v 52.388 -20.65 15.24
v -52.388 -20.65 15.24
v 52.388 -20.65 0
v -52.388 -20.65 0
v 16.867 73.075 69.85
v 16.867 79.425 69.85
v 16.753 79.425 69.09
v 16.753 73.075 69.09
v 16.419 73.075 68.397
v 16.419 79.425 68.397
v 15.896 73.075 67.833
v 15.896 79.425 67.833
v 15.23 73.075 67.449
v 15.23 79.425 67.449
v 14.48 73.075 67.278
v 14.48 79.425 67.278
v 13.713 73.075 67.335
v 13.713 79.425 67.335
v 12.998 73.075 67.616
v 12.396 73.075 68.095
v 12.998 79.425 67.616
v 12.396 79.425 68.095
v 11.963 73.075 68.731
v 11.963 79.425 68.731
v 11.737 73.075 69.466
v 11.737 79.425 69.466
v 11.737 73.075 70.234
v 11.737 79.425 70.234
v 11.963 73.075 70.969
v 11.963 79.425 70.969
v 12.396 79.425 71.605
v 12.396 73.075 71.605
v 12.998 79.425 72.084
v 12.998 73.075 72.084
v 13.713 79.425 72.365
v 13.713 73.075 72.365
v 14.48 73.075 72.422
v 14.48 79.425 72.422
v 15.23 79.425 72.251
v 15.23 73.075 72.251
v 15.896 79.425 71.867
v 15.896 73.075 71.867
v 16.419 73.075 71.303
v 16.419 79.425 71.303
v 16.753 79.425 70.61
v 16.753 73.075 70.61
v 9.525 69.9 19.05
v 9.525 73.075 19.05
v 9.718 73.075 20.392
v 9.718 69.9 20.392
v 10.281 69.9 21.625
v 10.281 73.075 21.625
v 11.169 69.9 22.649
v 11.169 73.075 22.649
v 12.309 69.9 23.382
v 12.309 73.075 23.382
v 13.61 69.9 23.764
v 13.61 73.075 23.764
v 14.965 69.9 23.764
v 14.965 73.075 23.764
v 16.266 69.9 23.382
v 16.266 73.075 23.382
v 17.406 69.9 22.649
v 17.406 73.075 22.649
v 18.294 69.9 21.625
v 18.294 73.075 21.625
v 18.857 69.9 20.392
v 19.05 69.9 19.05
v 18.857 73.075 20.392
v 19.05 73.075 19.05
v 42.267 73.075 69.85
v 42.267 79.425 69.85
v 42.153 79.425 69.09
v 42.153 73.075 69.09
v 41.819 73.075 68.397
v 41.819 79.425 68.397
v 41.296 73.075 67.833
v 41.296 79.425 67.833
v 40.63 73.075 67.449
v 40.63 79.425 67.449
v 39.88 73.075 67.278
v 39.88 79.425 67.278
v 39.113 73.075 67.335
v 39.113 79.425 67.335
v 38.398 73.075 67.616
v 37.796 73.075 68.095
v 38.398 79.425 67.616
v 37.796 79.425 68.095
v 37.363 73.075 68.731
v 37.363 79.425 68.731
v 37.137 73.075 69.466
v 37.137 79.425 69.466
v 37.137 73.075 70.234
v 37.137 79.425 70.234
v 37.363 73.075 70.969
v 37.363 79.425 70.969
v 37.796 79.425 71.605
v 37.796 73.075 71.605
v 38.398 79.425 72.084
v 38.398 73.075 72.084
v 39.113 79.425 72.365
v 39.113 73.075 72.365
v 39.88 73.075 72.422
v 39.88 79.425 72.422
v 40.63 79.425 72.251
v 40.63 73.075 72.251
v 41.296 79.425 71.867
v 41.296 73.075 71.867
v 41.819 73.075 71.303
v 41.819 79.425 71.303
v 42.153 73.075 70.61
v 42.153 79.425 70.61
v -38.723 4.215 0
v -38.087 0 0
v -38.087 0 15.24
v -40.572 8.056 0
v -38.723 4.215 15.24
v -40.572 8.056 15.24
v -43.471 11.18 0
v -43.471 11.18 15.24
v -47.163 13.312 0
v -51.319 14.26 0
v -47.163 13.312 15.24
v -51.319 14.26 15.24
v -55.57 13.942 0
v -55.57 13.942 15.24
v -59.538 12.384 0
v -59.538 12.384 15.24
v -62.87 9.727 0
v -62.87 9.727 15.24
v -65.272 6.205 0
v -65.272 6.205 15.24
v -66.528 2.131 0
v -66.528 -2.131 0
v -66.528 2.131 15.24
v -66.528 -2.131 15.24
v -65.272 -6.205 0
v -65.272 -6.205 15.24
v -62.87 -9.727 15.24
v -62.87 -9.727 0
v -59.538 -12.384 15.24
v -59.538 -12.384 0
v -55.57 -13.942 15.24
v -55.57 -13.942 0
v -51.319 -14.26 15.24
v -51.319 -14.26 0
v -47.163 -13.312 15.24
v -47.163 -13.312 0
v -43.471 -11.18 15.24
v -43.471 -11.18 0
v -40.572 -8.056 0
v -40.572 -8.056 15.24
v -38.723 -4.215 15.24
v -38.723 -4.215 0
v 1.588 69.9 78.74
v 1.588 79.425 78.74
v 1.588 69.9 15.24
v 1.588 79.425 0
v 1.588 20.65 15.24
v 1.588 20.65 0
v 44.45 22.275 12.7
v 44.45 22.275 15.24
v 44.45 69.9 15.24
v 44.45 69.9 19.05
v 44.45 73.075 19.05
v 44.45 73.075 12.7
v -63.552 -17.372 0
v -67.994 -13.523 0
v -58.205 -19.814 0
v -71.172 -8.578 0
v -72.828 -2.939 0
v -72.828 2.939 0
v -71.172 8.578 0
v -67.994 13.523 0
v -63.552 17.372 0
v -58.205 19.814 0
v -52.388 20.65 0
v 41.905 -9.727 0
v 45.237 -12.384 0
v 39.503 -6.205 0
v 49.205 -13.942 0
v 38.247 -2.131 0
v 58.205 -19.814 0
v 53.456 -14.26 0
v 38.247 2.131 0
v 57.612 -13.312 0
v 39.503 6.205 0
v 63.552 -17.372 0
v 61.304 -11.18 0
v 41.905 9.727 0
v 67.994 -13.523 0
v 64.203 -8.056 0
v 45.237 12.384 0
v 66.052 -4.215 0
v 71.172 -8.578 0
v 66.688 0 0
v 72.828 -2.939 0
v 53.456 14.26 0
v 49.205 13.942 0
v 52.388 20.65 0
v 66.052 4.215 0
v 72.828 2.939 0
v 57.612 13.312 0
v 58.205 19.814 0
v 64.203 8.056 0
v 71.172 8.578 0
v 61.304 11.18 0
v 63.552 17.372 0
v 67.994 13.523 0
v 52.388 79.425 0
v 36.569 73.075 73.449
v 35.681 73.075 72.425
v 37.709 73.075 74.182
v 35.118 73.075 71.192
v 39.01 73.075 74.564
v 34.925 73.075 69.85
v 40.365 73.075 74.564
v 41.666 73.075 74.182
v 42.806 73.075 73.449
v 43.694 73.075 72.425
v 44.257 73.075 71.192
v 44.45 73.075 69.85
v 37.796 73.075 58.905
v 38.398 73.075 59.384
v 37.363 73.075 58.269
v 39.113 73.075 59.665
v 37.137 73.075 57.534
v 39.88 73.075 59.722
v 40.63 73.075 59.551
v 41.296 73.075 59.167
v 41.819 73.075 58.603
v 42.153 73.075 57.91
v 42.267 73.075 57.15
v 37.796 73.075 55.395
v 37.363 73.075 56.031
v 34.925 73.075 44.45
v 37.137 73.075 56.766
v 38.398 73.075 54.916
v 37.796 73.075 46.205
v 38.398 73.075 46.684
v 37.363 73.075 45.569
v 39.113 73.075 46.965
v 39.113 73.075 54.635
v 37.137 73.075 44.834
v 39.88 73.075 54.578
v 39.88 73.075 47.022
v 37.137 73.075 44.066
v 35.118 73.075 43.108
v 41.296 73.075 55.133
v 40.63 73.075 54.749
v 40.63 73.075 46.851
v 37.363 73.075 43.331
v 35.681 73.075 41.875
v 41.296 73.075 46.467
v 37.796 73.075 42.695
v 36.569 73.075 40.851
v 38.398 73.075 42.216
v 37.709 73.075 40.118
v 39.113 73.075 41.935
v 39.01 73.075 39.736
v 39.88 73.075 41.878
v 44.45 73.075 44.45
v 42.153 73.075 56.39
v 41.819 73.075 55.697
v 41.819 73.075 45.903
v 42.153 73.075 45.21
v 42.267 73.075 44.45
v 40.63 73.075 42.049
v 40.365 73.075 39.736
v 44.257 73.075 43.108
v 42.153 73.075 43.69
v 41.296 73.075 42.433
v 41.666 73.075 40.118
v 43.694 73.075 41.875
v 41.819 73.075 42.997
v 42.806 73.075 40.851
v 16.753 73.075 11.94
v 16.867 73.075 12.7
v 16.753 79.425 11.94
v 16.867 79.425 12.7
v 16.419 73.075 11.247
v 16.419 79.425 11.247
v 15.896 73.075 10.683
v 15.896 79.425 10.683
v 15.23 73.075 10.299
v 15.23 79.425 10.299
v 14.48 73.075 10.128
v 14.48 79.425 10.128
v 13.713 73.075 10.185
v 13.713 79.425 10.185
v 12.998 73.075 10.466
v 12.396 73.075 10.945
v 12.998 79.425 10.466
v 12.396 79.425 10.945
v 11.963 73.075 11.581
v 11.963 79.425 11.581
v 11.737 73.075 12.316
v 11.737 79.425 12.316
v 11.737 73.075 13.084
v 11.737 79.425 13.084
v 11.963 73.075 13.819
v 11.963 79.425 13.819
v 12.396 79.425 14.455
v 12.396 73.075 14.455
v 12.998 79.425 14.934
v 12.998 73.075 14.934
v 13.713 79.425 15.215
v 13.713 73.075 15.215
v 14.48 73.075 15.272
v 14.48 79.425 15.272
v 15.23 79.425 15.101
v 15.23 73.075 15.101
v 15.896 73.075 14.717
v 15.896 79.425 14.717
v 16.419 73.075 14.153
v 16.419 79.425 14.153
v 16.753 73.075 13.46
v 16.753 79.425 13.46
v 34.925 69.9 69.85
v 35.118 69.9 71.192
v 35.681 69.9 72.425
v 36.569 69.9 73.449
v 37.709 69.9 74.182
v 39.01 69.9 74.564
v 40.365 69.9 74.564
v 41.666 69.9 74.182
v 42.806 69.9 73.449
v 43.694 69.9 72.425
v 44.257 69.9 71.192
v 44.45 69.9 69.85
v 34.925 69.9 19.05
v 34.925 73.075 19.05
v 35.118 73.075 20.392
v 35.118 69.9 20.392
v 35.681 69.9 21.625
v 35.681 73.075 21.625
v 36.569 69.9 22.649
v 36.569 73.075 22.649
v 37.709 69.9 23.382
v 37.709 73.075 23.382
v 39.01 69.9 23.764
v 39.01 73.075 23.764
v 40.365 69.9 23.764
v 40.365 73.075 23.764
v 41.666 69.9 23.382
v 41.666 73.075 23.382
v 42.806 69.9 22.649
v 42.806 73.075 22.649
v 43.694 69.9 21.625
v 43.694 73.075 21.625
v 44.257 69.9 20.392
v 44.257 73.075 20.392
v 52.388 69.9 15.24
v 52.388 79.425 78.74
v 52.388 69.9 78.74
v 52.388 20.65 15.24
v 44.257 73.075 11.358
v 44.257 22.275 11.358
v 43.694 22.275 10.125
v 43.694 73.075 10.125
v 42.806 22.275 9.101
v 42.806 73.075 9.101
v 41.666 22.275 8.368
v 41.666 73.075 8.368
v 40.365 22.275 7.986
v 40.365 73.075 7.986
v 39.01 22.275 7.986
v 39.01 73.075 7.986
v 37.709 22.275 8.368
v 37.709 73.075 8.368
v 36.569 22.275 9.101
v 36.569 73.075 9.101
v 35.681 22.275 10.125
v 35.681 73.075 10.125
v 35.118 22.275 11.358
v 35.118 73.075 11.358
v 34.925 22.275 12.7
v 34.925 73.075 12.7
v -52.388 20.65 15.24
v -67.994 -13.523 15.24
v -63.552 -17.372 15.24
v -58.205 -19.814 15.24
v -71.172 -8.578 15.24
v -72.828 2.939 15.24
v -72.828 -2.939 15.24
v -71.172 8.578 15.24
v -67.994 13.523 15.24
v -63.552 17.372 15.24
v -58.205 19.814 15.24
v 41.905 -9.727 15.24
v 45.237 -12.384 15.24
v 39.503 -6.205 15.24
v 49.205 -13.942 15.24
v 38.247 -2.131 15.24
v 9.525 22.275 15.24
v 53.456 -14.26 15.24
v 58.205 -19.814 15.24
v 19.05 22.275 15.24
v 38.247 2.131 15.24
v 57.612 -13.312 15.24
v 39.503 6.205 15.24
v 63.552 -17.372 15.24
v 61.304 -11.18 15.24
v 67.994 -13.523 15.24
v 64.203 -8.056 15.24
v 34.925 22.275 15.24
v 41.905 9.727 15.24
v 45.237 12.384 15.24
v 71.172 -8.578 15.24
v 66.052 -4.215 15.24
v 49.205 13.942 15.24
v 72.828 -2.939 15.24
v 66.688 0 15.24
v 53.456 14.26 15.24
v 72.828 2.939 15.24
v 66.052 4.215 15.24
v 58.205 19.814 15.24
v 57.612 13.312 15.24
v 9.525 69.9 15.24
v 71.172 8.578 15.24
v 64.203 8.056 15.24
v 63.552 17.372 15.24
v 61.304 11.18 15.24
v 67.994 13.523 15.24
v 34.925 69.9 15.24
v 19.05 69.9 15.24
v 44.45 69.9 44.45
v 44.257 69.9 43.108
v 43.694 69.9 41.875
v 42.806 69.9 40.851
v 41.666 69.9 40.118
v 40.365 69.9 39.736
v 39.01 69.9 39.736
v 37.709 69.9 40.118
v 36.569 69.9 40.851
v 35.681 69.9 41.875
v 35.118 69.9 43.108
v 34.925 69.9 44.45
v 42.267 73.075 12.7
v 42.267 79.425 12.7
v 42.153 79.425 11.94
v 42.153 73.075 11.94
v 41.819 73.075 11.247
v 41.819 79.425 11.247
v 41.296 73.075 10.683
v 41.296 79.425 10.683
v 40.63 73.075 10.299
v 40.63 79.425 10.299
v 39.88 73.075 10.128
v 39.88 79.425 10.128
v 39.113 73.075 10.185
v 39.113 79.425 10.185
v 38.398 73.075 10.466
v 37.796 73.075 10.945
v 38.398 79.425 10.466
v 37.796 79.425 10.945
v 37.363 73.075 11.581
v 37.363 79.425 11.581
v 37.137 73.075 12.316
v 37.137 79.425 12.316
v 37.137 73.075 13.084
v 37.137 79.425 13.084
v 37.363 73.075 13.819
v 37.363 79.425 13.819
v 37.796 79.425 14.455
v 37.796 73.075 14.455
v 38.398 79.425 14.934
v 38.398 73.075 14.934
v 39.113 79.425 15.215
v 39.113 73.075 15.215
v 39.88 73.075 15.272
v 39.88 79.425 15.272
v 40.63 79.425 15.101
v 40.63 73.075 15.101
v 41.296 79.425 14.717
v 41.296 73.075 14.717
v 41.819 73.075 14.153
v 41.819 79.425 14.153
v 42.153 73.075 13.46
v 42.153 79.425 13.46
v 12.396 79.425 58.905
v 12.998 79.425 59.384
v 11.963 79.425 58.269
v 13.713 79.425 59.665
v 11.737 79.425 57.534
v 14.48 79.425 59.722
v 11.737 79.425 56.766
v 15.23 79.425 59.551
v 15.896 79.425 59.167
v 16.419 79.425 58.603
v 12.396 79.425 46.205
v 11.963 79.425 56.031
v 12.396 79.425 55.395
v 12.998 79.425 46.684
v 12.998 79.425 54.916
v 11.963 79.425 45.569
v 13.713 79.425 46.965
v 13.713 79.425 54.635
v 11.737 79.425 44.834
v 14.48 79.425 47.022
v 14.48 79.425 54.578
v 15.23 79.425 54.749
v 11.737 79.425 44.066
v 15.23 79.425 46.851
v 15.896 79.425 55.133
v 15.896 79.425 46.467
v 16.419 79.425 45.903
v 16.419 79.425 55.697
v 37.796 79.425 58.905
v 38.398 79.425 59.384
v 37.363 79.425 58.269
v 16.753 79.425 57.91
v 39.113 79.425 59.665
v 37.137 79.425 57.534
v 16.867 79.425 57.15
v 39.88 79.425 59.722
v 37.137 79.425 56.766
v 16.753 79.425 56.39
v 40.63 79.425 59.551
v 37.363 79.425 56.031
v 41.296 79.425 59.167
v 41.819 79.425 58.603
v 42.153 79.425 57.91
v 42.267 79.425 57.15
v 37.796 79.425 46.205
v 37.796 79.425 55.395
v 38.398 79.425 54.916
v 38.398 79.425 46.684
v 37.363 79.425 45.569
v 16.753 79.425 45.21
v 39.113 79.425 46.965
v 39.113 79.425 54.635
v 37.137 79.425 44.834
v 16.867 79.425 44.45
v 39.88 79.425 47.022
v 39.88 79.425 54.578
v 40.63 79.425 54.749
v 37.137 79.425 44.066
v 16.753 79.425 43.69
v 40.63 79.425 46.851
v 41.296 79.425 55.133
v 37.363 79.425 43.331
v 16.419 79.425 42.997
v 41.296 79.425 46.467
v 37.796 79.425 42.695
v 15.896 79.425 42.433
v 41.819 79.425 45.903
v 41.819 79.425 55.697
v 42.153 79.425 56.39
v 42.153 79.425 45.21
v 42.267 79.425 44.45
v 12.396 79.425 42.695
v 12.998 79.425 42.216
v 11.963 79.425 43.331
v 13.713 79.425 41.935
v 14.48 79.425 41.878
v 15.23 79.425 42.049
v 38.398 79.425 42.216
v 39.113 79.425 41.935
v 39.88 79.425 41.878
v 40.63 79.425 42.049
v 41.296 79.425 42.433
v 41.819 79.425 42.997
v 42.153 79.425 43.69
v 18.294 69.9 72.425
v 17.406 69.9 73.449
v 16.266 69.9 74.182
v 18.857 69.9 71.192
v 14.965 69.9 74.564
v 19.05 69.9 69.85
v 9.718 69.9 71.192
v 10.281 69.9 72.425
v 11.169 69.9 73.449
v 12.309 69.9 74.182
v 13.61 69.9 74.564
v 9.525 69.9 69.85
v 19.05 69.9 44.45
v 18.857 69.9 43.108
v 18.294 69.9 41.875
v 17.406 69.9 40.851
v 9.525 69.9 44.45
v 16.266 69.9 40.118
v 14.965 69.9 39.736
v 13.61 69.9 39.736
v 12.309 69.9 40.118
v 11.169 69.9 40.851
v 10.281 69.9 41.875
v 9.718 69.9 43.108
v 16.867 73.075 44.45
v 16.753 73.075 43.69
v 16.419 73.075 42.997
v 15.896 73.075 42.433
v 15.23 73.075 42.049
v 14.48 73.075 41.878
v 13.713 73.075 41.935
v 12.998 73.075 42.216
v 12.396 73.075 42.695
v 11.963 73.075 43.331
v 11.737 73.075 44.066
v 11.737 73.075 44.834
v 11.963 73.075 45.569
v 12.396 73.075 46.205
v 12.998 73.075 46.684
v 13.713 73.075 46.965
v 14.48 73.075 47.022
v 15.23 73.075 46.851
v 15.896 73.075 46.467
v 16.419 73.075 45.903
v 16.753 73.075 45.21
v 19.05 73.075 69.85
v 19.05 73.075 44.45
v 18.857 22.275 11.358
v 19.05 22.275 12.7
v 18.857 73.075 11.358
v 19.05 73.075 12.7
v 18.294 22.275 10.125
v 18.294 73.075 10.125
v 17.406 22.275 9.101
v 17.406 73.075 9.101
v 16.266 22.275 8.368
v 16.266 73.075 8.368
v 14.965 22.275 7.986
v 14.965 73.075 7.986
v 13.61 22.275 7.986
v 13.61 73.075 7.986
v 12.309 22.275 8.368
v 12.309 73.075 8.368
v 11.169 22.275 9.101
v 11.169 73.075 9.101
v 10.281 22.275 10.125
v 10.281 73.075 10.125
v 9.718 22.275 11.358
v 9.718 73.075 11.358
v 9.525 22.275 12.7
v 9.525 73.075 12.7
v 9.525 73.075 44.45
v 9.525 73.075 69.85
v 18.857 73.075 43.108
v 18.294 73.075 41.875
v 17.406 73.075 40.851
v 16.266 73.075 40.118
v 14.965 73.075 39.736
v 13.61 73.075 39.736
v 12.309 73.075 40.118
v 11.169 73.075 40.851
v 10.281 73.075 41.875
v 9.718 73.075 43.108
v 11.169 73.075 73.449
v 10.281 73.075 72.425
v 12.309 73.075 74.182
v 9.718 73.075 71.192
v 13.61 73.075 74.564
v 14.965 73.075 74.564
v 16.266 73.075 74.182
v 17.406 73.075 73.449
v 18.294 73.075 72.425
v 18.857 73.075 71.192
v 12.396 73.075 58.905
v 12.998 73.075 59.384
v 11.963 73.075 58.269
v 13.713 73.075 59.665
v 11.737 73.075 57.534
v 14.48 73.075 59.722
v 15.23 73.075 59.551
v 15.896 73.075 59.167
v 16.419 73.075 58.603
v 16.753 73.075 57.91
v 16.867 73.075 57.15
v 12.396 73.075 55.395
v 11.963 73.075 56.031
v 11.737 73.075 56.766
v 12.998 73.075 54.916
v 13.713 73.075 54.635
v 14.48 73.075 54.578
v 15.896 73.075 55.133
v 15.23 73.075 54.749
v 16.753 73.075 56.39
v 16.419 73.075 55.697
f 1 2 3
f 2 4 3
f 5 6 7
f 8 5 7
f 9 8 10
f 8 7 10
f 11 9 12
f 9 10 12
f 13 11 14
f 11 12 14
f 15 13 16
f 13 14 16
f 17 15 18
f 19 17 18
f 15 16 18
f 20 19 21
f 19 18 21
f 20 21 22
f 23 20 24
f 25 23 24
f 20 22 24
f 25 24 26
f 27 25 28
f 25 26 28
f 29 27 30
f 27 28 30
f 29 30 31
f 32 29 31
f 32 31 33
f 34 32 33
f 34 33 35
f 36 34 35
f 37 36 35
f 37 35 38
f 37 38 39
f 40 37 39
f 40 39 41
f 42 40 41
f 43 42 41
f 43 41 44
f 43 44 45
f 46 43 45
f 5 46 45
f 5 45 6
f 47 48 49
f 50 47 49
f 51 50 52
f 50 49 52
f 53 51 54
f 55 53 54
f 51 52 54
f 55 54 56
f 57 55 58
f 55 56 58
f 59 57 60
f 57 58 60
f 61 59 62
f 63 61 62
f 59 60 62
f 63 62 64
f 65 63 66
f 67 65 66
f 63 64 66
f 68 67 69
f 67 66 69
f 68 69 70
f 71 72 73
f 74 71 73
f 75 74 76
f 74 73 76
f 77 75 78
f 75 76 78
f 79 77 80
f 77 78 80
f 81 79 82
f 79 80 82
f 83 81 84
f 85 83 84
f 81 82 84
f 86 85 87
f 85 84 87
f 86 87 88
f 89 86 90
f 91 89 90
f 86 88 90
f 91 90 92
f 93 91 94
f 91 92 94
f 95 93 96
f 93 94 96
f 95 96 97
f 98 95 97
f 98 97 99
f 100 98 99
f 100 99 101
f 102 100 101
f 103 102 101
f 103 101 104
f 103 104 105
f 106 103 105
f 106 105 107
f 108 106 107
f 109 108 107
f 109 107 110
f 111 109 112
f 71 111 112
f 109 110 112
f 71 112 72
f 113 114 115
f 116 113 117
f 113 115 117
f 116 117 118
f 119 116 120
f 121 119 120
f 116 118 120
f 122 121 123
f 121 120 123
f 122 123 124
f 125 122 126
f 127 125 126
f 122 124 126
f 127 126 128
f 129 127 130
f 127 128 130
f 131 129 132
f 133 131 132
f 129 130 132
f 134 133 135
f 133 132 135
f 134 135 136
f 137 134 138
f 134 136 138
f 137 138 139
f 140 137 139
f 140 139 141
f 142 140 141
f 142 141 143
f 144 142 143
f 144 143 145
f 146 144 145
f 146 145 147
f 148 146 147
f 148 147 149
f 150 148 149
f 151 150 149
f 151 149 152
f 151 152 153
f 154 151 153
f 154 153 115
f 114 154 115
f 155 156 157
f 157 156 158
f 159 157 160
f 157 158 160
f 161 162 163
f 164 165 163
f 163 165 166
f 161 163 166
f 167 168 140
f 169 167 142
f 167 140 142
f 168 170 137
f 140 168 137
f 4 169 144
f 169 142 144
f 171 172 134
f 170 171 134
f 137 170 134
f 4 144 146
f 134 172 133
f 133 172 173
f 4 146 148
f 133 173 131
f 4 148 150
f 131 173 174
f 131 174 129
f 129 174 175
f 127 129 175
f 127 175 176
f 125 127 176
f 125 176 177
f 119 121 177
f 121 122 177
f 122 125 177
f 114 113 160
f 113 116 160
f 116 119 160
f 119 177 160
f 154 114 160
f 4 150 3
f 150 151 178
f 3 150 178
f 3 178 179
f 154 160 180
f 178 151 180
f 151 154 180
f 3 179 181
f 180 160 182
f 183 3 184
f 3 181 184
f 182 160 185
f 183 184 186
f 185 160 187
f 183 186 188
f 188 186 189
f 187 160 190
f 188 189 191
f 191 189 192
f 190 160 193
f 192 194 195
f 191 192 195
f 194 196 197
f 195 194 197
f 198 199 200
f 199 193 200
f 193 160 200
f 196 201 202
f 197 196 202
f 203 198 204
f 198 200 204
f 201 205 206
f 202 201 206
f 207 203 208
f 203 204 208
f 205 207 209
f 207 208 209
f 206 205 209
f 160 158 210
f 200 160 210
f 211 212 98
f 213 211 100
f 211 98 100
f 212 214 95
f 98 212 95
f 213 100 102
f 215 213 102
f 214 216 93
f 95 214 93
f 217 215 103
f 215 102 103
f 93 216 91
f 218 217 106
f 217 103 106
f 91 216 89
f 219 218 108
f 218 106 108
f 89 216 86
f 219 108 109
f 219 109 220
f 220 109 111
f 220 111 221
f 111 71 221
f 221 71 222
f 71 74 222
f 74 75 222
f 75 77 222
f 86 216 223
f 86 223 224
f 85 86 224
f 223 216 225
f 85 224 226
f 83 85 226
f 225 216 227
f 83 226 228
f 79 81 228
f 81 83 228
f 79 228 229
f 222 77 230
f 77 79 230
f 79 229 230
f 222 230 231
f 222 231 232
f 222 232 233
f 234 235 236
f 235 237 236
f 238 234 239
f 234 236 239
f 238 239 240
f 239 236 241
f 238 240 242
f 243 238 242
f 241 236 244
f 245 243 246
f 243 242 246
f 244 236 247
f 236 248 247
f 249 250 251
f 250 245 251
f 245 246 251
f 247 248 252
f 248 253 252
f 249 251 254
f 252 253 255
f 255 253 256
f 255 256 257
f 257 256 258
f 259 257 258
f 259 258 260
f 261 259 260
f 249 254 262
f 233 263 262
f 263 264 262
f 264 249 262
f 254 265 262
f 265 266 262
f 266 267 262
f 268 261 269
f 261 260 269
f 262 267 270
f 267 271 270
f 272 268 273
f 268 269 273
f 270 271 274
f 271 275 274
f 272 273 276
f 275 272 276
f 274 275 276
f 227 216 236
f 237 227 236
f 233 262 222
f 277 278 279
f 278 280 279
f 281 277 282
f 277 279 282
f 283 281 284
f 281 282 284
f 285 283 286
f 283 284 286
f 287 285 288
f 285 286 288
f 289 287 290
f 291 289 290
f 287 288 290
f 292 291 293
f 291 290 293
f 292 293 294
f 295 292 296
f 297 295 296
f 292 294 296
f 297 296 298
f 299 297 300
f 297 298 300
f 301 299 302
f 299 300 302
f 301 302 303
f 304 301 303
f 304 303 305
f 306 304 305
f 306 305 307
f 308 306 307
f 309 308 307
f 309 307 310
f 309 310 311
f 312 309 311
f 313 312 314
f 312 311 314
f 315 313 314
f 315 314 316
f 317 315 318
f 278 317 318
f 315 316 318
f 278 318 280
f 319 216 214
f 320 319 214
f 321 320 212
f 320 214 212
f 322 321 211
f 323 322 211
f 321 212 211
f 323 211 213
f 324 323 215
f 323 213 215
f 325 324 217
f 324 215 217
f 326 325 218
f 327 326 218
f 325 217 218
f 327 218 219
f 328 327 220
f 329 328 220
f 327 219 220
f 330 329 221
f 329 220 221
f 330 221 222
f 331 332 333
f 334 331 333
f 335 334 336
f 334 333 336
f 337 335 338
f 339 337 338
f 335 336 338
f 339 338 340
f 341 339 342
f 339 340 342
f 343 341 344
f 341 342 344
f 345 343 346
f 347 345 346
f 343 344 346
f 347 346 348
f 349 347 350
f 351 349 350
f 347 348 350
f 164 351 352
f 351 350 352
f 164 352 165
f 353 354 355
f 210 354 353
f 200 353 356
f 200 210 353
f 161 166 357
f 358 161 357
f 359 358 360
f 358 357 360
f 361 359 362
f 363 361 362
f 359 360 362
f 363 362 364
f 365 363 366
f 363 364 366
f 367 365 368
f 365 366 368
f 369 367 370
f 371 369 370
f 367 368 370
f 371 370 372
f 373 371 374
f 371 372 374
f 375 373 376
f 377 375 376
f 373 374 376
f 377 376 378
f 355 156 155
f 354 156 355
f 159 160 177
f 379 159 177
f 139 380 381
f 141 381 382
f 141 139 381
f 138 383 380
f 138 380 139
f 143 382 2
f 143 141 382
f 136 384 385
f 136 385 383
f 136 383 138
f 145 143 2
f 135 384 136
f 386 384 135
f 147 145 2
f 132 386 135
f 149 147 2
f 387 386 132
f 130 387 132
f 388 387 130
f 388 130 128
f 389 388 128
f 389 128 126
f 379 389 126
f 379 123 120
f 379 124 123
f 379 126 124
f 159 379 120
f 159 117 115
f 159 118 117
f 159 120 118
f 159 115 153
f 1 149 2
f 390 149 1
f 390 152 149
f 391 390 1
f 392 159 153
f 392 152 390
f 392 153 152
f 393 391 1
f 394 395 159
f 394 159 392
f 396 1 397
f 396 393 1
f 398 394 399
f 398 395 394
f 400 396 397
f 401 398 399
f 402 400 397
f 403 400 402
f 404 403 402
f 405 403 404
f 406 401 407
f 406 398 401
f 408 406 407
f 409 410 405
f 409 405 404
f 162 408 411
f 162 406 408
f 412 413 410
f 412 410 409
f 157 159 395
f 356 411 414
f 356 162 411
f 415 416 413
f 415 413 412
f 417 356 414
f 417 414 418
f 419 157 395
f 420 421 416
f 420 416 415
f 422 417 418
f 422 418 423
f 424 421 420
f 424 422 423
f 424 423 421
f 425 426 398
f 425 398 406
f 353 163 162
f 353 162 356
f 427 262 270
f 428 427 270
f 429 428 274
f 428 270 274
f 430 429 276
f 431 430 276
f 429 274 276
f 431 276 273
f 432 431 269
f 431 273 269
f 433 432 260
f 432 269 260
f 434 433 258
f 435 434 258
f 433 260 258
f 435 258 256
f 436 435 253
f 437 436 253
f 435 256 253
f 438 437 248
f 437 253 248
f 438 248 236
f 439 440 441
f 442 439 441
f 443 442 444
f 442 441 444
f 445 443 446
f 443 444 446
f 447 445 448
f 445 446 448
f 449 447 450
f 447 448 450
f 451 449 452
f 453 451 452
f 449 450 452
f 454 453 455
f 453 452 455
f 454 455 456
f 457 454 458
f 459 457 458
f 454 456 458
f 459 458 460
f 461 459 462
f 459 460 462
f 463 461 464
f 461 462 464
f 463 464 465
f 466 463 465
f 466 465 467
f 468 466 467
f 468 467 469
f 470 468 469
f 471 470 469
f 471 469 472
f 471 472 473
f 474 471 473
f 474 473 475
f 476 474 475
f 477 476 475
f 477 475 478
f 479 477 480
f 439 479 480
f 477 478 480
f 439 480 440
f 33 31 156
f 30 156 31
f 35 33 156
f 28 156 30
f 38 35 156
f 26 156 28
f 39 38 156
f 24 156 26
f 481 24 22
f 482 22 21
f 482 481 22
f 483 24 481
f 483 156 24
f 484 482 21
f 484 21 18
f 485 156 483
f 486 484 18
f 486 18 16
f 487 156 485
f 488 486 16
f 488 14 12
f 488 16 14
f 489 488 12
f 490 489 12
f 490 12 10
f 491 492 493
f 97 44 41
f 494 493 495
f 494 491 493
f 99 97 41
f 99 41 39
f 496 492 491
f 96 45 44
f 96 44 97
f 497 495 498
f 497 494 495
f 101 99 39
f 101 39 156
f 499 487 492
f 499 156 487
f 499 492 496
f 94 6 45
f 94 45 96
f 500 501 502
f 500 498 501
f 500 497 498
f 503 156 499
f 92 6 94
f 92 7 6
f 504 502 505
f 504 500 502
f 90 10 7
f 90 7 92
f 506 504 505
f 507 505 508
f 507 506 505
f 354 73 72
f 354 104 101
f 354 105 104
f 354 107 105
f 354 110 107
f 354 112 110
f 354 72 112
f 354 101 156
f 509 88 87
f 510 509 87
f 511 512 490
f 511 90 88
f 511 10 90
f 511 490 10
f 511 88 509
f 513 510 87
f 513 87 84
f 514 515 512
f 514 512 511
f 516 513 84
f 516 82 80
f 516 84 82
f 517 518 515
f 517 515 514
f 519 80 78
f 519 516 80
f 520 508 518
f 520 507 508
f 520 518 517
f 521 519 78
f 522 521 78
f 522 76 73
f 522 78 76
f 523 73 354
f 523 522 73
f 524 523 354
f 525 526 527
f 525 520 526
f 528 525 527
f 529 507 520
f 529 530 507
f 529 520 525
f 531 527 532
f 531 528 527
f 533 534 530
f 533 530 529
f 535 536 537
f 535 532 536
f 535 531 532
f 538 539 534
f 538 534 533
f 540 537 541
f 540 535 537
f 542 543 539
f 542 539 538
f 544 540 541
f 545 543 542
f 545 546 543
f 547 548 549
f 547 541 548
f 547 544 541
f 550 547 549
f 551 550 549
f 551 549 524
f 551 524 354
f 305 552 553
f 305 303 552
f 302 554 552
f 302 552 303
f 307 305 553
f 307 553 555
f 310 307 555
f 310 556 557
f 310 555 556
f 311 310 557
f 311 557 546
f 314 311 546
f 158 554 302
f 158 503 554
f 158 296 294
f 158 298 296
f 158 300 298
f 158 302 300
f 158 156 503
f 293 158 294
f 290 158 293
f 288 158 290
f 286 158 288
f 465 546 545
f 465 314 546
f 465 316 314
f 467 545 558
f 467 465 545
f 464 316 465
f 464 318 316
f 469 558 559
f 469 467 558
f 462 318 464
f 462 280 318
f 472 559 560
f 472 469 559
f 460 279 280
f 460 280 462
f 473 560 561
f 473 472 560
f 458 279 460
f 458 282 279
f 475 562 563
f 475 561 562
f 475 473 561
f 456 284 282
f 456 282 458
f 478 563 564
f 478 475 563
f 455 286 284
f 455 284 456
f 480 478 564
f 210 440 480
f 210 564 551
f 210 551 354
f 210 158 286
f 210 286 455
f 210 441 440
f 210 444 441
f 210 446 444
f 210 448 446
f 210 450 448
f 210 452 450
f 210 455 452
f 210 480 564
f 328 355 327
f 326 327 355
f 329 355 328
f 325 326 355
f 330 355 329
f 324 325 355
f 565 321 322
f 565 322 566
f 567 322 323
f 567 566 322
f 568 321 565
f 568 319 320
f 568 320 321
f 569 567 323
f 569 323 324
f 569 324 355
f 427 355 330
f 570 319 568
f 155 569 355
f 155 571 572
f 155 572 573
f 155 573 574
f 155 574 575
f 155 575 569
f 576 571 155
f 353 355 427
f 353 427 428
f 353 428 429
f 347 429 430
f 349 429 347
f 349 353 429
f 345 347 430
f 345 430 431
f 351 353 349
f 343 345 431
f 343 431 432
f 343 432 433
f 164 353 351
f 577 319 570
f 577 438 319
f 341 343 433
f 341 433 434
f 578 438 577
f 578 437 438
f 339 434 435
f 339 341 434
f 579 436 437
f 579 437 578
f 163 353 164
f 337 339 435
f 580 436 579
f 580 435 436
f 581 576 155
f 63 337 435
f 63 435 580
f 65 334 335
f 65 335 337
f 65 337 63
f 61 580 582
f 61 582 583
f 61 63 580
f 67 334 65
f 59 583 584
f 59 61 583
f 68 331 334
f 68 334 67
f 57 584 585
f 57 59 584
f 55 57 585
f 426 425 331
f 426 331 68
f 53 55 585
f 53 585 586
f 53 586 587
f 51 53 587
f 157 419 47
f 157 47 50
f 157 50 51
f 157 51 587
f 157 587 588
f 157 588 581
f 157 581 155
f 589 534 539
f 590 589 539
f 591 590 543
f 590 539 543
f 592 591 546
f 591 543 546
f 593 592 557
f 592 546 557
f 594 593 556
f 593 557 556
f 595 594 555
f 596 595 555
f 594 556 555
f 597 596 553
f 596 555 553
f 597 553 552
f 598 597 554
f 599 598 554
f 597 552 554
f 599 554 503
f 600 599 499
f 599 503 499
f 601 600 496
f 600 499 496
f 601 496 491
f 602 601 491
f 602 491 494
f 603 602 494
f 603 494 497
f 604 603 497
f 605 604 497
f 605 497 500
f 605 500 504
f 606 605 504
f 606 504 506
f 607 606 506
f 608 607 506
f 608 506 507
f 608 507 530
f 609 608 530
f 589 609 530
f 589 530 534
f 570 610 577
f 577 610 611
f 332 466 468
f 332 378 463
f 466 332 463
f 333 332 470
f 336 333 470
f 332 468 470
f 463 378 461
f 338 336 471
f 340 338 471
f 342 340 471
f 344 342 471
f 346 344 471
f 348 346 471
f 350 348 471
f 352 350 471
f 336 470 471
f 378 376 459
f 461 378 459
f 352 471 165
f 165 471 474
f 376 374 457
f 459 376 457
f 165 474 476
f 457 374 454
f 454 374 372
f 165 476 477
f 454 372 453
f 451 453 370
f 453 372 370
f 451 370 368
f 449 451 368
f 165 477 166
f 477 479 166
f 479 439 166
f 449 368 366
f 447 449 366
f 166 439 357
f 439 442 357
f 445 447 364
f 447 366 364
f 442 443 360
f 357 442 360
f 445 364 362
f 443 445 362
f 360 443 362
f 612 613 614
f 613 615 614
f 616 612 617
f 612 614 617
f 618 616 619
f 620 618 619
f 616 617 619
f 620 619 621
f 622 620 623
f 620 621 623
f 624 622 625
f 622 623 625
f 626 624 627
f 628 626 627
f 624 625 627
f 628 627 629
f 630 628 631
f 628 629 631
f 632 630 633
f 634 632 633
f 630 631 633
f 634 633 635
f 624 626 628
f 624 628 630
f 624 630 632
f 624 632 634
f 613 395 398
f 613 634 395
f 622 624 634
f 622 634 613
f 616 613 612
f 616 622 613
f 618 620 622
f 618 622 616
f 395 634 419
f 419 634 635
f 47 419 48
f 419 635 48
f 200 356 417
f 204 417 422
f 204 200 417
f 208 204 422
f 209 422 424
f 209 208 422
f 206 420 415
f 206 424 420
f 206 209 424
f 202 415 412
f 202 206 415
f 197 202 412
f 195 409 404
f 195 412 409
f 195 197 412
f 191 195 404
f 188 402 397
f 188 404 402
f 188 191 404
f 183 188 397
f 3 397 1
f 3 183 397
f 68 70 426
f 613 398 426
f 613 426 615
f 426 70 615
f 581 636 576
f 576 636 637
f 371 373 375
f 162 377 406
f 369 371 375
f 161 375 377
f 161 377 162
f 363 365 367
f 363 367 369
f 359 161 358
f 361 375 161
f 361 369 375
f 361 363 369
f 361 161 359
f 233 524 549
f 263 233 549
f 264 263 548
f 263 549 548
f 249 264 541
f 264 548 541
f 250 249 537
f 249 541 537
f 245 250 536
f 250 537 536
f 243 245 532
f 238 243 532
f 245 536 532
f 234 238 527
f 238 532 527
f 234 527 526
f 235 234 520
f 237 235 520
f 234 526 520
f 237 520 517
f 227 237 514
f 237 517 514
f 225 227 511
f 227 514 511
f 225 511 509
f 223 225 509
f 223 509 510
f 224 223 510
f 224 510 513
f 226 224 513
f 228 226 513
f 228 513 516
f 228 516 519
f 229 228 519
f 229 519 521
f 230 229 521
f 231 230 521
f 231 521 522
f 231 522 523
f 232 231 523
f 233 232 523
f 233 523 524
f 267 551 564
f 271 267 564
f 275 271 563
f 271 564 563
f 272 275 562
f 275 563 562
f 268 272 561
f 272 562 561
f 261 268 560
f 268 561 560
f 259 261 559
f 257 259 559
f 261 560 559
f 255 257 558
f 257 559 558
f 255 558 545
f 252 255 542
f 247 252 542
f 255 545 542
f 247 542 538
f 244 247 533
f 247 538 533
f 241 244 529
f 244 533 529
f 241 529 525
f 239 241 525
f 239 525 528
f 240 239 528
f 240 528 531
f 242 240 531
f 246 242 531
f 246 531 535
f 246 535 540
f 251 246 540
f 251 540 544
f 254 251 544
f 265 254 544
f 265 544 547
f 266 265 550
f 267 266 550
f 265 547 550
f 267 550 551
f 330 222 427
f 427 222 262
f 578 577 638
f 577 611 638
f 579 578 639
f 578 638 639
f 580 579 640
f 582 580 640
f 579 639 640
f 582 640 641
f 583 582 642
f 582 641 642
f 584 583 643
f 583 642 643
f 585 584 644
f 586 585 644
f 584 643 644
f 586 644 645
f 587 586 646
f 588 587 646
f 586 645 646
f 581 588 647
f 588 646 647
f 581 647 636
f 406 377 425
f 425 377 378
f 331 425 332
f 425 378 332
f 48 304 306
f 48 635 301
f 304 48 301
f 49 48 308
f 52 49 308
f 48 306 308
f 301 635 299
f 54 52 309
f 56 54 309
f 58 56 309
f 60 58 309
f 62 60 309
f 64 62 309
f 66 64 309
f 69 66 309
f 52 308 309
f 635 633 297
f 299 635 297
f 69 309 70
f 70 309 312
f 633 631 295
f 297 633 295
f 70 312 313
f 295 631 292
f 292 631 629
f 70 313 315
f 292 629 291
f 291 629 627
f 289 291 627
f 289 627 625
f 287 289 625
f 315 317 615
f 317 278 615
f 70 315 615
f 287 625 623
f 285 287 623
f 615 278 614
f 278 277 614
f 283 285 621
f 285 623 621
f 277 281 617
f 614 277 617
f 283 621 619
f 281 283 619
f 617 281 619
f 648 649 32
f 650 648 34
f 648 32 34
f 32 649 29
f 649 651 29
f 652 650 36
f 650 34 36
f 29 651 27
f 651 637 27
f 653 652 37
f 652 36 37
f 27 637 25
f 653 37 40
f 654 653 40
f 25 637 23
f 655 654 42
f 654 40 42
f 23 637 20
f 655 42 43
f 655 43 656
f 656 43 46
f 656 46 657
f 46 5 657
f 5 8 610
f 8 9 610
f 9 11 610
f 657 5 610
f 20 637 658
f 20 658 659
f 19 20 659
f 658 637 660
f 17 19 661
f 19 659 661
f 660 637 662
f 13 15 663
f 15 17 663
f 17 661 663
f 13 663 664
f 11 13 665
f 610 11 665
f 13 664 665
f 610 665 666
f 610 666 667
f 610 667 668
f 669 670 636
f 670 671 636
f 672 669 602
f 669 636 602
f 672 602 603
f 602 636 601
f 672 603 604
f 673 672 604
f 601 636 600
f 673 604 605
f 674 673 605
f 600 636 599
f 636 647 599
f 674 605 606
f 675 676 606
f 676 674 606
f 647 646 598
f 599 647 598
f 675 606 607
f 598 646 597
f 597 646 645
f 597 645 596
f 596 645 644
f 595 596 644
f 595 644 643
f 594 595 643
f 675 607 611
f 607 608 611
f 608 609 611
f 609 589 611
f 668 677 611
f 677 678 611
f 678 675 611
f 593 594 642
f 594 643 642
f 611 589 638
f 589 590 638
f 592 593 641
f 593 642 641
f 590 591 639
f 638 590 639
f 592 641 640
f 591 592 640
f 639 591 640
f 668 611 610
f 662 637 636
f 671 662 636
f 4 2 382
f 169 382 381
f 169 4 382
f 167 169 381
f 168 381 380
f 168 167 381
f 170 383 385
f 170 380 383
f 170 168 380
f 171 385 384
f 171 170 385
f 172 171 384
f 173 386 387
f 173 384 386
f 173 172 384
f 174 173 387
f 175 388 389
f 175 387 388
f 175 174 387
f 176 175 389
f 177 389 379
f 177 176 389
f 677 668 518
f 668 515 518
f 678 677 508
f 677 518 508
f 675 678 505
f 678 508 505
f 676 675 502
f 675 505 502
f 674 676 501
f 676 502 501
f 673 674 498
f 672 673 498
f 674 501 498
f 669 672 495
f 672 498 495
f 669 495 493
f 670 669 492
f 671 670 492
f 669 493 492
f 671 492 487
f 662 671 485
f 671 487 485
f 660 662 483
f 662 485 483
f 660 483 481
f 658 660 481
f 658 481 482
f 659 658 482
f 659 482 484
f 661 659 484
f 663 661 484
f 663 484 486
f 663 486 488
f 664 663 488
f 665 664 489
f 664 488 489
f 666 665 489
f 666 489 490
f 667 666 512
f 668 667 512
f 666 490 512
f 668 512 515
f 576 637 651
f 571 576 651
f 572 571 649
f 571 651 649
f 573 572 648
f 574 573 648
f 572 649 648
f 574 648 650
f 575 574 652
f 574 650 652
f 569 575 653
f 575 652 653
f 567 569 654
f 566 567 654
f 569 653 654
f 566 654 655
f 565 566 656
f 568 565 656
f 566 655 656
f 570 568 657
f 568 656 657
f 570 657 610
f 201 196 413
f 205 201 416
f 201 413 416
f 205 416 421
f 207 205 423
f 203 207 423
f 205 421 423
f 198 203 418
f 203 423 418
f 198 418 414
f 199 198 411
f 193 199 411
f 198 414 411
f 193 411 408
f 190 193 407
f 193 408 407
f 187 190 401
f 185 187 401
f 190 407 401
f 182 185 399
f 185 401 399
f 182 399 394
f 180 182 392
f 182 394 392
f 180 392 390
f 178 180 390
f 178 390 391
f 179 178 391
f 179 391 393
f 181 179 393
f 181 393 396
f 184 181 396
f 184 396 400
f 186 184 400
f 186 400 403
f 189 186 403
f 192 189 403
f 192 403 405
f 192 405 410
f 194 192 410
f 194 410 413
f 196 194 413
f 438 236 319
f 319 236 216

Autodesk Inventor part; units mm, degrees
ref_plane "YZ Plane" through (0, 0, 0) normal (1, 0, 0) x (0, 1, 0)
ref_plane "XZ Plane" through (0, 0, 0) normal (0, 1, 0) x (-1, 0, 0)
sketch "Sketch1" plane through (0, 0, 0) normal (0, 0, 1) x (1, 0, 0)
  line L0 (-52.3875, 0) -> (52.3875, 0) construction
  line L1 (-52.3875, -20.6502) -> (52.3875, -20.6502)
  line L2 (52.3875, 20.6502) -> (-52.3875, 20.6502)
  arc A0 (-52.3875, 20.6502) -> (-52.3875, -20.6502) centre (-52.3875, 0) ccw
  arc A1 (52.3875, -20.6502) -> (52.3875, 20.6502) centre (52.3875, 0) ccw
  point P0 (0, 0)
  dimension "d0" = 104.775
  dimension "d1" = 20.6502
extrude "Extrusion1" add sketch "Sketch1" along normal blind 15.24
sketch "Sketch2" plane through (0, 0, 15.24) normal (0, 0, 1) x (1, 0, 0)
  arc A0 (-52.3875, 20.6502) -> (-52.3875, -20.6502) centre (-52.3875, 0) ccw projected
  circle A1 centre (-52.3875, 0) radius 14.3002
  arc A2 (52.3875, -20.6502) -> (52.3875, 20.6502) centre (52.3875, 0) ccw projected
  circle A3 centre (52.3875, 0) radius 14.3002
  point P0 (0, 0)
  dimension "d4" = 28.6004
extrude "Extrusion2" cut sketch "Sketch2" against normal through all
sketch "Sketch3" plane through (0, 0, 15.24) normal (0, 0, 1) x (1, 0, 0)
  line L0 (1.5875, 79.4246) -> (52.3875, 79.4246)
  line L1 (52.3875, 79.4246) -> (52.3875, 20.6502)
  line L2 (52.3875, 20.6502) -> (1.5875, 20.6502)
  line L3 (1.5875, 20.6502) -> (1.5875, 79.4246)
  line L4 (52.3875, 20.6502) -> (-52.3875, 20.6502) projected
  circle A0 centre (26.9875, 101.6496) radius 7.0281
  circle A1 centre (52.3875, 0) radius 14.3002 projected
  point P0 (0, 0)
  point P1 (26.9875, 20.6502)
  point P2 (26.9875, 79.4246)
  dimension "d7" = 50.8
  dimension "d8" = 22.225
  dimension "d9" = 104.775
  dimension "d10" = 79.4246
extrude "Extrusion3" add sketch "Sketch3" against normal up to surface (15.24 mm away) contours L0 L1 L2 L3
sketch "Sketch4" plane through (0, 0, 15.24) normal (0, 0, 1) x (1, 0, 0)
  line L0 (1.5875, 79.4246) -> (1.5875, 20.6502) projected
  line L1 (1.5875, 79.4246) -> (52.3875, 79.4246)
  line L2 (52.3875, 79.4246) -> (52.3875, 69.8996)
  line L3 (52.3875, 69.8996) -> (1.5875, 69.8996)
  line L4 (1.5875, 69.8996) -> (1.5875, 79.4246)
  line L5 (52.3875, 20.6502) -> (52.3875, 79.4246) projected
  point P0 (0, 0)
  point P1 (25.4, 20.6502)
  dimension "d13" = 9.525
extrude "Extrusion4" add sketch "Sketch4" along normal blind 63.5
sketch "Sketch5" plane through (1.5875, 79.4246, 0) normal (0, 1, 0) x (1, 0, 0)
  circle A0 centre (38.1, -12.7) radius 2.5797
  line L0 (0, 0) -> (50.8, 0) projected
  line L1 (50.8, 0) -> (50.8, -78.74) projected
  circle A1 centre (12.7, -12.7) radius 2.5797
  circle A2 centre (38.1, -44.45) radius 2.5797
  circle A3 centre (12.7, -44.45) radius 2.5797
  circle A4 centre (38.1, -57.15) radius 2.5797
  circle A5 centre (12.7, -57.15) radius 2.5797
  circle A6 centre (38.1, -69.85) radius 2.5797
  circle A7 centre (12.7, -69.85) radius 2.5797
  line L2 (25.4, 0) -> (25.4, -6.0461)
  dimension "d17" = 5.1594
  dimension "d18" = 12.7
  dimension "d21" = 25.4
  dimension "d24" = 31.75
  dimension "d29" = 12.7
  dimension "d51" = 12.7
extrude "Extrusion5" cut sketch "Sketch5" against normal blind 50.8
ref_plane "Work Plane1" through (1.5875, 73.0746, 0) normal (0, 1, 0) x (1, 0, 0)
sketch "Sketch6" plane through (1.5875, 73.0746, 0) normal (0, 1, 0) x (1, 0, 0)
  line L0 (-53.975, 0) -> (50.8, 0) projected
  line L1 (50.8, -15.24) -> (50.8, -78.74) projected
  line L2 (38.1, -12.7) -> (38.1, -19.05) construction
  line L3 (33.3375, -12.7) -> (33.3375, -19.05)
  line L4 (42.8625, -19.05) -> (42.8625, -12.7)
  arc A0 (42.8625, -12.7) -> (33.3375, -12.7) centre (38.1, -12.7) ccw
  arc A1 (33.3375, -19.05) -> (42.8625, -19.05) centre (38.1, -19.05) ccw
  line L5 (12.7, -12.7) -> (12.7, -19.05) construction
  line L6 (7.9375, -12.7) -> (7.9375, -19.05)
  line L7 (17.4625, -19.05) -> (17.4625, -12.7)
  arc A2 (17.4625, -12.7) -> (7.9375, -12.7) centre (12.7, -12.7) ccw
  arc A3 (7.9375, -19.05) -> (17.4625, -19.05) centre (12.7, -19.05) ccw
  circle A4 centre (38.1, -44.45) radius 2.5797 construction
  circle A5 centre (38.1, -69.85) radius 2.5797 construction
  line L8 (38.1, -44.45) -> (38.1, -69.85) construction
  line L9 (33.3375, -44.45) -> (33.3375, -69.85)
  line L10 (42.8625, -69.85) -> (42.8625, -44.45)
  arc A6 (42.8625, -44.45) -> (33.3375, -44.45) centre (38.1, -44.45) ccw
  arc A7 (33.3375, -69.85) -> (42.8625, -69.85) centre (38.1, -69.85) ccw
  circle A8 centre (12.7, -44.45) radius 2.5797 construction
  circle A9 centre (12.7, -69.85) radius 2.5797 construction
  line L11 (12.7, -44.45) -> (12.7, -69.85) construction
  line L12 (7.9375, -44.45) -> (7.9375, -69.85)
  line L13 (17.4625, -69.85) -> (17.4625, -44.45)
  arc A10 (17.4625, -44.45) -> (7.9375, -44.45) centre (12.7, -44.45) ccw
  arc A11 (7.9375, -69.85) -> (17.4625, -69.85) centre (12.7, -69.85) ccw
  circle A12 centre (38.1, -12.7) radius 2.5797 construction
  circle A13 centre (12.7, -12.7) radius 2.5797 construction
  point P0 (-1.5875, 0)
  point P1 (38.1, -15.875)
  point P2 (12.7, -15.875)
  point P3 (38.1, -57.15)
  point P4 (12.7, -57.15)
  dimension "d47" = 6.35
  dimension "d48" = 4.7625
extrude "Extrusion6" cut sketch "Sketch6" against normal blind 50.8
properties part number "IntakeChainLinkVP"
